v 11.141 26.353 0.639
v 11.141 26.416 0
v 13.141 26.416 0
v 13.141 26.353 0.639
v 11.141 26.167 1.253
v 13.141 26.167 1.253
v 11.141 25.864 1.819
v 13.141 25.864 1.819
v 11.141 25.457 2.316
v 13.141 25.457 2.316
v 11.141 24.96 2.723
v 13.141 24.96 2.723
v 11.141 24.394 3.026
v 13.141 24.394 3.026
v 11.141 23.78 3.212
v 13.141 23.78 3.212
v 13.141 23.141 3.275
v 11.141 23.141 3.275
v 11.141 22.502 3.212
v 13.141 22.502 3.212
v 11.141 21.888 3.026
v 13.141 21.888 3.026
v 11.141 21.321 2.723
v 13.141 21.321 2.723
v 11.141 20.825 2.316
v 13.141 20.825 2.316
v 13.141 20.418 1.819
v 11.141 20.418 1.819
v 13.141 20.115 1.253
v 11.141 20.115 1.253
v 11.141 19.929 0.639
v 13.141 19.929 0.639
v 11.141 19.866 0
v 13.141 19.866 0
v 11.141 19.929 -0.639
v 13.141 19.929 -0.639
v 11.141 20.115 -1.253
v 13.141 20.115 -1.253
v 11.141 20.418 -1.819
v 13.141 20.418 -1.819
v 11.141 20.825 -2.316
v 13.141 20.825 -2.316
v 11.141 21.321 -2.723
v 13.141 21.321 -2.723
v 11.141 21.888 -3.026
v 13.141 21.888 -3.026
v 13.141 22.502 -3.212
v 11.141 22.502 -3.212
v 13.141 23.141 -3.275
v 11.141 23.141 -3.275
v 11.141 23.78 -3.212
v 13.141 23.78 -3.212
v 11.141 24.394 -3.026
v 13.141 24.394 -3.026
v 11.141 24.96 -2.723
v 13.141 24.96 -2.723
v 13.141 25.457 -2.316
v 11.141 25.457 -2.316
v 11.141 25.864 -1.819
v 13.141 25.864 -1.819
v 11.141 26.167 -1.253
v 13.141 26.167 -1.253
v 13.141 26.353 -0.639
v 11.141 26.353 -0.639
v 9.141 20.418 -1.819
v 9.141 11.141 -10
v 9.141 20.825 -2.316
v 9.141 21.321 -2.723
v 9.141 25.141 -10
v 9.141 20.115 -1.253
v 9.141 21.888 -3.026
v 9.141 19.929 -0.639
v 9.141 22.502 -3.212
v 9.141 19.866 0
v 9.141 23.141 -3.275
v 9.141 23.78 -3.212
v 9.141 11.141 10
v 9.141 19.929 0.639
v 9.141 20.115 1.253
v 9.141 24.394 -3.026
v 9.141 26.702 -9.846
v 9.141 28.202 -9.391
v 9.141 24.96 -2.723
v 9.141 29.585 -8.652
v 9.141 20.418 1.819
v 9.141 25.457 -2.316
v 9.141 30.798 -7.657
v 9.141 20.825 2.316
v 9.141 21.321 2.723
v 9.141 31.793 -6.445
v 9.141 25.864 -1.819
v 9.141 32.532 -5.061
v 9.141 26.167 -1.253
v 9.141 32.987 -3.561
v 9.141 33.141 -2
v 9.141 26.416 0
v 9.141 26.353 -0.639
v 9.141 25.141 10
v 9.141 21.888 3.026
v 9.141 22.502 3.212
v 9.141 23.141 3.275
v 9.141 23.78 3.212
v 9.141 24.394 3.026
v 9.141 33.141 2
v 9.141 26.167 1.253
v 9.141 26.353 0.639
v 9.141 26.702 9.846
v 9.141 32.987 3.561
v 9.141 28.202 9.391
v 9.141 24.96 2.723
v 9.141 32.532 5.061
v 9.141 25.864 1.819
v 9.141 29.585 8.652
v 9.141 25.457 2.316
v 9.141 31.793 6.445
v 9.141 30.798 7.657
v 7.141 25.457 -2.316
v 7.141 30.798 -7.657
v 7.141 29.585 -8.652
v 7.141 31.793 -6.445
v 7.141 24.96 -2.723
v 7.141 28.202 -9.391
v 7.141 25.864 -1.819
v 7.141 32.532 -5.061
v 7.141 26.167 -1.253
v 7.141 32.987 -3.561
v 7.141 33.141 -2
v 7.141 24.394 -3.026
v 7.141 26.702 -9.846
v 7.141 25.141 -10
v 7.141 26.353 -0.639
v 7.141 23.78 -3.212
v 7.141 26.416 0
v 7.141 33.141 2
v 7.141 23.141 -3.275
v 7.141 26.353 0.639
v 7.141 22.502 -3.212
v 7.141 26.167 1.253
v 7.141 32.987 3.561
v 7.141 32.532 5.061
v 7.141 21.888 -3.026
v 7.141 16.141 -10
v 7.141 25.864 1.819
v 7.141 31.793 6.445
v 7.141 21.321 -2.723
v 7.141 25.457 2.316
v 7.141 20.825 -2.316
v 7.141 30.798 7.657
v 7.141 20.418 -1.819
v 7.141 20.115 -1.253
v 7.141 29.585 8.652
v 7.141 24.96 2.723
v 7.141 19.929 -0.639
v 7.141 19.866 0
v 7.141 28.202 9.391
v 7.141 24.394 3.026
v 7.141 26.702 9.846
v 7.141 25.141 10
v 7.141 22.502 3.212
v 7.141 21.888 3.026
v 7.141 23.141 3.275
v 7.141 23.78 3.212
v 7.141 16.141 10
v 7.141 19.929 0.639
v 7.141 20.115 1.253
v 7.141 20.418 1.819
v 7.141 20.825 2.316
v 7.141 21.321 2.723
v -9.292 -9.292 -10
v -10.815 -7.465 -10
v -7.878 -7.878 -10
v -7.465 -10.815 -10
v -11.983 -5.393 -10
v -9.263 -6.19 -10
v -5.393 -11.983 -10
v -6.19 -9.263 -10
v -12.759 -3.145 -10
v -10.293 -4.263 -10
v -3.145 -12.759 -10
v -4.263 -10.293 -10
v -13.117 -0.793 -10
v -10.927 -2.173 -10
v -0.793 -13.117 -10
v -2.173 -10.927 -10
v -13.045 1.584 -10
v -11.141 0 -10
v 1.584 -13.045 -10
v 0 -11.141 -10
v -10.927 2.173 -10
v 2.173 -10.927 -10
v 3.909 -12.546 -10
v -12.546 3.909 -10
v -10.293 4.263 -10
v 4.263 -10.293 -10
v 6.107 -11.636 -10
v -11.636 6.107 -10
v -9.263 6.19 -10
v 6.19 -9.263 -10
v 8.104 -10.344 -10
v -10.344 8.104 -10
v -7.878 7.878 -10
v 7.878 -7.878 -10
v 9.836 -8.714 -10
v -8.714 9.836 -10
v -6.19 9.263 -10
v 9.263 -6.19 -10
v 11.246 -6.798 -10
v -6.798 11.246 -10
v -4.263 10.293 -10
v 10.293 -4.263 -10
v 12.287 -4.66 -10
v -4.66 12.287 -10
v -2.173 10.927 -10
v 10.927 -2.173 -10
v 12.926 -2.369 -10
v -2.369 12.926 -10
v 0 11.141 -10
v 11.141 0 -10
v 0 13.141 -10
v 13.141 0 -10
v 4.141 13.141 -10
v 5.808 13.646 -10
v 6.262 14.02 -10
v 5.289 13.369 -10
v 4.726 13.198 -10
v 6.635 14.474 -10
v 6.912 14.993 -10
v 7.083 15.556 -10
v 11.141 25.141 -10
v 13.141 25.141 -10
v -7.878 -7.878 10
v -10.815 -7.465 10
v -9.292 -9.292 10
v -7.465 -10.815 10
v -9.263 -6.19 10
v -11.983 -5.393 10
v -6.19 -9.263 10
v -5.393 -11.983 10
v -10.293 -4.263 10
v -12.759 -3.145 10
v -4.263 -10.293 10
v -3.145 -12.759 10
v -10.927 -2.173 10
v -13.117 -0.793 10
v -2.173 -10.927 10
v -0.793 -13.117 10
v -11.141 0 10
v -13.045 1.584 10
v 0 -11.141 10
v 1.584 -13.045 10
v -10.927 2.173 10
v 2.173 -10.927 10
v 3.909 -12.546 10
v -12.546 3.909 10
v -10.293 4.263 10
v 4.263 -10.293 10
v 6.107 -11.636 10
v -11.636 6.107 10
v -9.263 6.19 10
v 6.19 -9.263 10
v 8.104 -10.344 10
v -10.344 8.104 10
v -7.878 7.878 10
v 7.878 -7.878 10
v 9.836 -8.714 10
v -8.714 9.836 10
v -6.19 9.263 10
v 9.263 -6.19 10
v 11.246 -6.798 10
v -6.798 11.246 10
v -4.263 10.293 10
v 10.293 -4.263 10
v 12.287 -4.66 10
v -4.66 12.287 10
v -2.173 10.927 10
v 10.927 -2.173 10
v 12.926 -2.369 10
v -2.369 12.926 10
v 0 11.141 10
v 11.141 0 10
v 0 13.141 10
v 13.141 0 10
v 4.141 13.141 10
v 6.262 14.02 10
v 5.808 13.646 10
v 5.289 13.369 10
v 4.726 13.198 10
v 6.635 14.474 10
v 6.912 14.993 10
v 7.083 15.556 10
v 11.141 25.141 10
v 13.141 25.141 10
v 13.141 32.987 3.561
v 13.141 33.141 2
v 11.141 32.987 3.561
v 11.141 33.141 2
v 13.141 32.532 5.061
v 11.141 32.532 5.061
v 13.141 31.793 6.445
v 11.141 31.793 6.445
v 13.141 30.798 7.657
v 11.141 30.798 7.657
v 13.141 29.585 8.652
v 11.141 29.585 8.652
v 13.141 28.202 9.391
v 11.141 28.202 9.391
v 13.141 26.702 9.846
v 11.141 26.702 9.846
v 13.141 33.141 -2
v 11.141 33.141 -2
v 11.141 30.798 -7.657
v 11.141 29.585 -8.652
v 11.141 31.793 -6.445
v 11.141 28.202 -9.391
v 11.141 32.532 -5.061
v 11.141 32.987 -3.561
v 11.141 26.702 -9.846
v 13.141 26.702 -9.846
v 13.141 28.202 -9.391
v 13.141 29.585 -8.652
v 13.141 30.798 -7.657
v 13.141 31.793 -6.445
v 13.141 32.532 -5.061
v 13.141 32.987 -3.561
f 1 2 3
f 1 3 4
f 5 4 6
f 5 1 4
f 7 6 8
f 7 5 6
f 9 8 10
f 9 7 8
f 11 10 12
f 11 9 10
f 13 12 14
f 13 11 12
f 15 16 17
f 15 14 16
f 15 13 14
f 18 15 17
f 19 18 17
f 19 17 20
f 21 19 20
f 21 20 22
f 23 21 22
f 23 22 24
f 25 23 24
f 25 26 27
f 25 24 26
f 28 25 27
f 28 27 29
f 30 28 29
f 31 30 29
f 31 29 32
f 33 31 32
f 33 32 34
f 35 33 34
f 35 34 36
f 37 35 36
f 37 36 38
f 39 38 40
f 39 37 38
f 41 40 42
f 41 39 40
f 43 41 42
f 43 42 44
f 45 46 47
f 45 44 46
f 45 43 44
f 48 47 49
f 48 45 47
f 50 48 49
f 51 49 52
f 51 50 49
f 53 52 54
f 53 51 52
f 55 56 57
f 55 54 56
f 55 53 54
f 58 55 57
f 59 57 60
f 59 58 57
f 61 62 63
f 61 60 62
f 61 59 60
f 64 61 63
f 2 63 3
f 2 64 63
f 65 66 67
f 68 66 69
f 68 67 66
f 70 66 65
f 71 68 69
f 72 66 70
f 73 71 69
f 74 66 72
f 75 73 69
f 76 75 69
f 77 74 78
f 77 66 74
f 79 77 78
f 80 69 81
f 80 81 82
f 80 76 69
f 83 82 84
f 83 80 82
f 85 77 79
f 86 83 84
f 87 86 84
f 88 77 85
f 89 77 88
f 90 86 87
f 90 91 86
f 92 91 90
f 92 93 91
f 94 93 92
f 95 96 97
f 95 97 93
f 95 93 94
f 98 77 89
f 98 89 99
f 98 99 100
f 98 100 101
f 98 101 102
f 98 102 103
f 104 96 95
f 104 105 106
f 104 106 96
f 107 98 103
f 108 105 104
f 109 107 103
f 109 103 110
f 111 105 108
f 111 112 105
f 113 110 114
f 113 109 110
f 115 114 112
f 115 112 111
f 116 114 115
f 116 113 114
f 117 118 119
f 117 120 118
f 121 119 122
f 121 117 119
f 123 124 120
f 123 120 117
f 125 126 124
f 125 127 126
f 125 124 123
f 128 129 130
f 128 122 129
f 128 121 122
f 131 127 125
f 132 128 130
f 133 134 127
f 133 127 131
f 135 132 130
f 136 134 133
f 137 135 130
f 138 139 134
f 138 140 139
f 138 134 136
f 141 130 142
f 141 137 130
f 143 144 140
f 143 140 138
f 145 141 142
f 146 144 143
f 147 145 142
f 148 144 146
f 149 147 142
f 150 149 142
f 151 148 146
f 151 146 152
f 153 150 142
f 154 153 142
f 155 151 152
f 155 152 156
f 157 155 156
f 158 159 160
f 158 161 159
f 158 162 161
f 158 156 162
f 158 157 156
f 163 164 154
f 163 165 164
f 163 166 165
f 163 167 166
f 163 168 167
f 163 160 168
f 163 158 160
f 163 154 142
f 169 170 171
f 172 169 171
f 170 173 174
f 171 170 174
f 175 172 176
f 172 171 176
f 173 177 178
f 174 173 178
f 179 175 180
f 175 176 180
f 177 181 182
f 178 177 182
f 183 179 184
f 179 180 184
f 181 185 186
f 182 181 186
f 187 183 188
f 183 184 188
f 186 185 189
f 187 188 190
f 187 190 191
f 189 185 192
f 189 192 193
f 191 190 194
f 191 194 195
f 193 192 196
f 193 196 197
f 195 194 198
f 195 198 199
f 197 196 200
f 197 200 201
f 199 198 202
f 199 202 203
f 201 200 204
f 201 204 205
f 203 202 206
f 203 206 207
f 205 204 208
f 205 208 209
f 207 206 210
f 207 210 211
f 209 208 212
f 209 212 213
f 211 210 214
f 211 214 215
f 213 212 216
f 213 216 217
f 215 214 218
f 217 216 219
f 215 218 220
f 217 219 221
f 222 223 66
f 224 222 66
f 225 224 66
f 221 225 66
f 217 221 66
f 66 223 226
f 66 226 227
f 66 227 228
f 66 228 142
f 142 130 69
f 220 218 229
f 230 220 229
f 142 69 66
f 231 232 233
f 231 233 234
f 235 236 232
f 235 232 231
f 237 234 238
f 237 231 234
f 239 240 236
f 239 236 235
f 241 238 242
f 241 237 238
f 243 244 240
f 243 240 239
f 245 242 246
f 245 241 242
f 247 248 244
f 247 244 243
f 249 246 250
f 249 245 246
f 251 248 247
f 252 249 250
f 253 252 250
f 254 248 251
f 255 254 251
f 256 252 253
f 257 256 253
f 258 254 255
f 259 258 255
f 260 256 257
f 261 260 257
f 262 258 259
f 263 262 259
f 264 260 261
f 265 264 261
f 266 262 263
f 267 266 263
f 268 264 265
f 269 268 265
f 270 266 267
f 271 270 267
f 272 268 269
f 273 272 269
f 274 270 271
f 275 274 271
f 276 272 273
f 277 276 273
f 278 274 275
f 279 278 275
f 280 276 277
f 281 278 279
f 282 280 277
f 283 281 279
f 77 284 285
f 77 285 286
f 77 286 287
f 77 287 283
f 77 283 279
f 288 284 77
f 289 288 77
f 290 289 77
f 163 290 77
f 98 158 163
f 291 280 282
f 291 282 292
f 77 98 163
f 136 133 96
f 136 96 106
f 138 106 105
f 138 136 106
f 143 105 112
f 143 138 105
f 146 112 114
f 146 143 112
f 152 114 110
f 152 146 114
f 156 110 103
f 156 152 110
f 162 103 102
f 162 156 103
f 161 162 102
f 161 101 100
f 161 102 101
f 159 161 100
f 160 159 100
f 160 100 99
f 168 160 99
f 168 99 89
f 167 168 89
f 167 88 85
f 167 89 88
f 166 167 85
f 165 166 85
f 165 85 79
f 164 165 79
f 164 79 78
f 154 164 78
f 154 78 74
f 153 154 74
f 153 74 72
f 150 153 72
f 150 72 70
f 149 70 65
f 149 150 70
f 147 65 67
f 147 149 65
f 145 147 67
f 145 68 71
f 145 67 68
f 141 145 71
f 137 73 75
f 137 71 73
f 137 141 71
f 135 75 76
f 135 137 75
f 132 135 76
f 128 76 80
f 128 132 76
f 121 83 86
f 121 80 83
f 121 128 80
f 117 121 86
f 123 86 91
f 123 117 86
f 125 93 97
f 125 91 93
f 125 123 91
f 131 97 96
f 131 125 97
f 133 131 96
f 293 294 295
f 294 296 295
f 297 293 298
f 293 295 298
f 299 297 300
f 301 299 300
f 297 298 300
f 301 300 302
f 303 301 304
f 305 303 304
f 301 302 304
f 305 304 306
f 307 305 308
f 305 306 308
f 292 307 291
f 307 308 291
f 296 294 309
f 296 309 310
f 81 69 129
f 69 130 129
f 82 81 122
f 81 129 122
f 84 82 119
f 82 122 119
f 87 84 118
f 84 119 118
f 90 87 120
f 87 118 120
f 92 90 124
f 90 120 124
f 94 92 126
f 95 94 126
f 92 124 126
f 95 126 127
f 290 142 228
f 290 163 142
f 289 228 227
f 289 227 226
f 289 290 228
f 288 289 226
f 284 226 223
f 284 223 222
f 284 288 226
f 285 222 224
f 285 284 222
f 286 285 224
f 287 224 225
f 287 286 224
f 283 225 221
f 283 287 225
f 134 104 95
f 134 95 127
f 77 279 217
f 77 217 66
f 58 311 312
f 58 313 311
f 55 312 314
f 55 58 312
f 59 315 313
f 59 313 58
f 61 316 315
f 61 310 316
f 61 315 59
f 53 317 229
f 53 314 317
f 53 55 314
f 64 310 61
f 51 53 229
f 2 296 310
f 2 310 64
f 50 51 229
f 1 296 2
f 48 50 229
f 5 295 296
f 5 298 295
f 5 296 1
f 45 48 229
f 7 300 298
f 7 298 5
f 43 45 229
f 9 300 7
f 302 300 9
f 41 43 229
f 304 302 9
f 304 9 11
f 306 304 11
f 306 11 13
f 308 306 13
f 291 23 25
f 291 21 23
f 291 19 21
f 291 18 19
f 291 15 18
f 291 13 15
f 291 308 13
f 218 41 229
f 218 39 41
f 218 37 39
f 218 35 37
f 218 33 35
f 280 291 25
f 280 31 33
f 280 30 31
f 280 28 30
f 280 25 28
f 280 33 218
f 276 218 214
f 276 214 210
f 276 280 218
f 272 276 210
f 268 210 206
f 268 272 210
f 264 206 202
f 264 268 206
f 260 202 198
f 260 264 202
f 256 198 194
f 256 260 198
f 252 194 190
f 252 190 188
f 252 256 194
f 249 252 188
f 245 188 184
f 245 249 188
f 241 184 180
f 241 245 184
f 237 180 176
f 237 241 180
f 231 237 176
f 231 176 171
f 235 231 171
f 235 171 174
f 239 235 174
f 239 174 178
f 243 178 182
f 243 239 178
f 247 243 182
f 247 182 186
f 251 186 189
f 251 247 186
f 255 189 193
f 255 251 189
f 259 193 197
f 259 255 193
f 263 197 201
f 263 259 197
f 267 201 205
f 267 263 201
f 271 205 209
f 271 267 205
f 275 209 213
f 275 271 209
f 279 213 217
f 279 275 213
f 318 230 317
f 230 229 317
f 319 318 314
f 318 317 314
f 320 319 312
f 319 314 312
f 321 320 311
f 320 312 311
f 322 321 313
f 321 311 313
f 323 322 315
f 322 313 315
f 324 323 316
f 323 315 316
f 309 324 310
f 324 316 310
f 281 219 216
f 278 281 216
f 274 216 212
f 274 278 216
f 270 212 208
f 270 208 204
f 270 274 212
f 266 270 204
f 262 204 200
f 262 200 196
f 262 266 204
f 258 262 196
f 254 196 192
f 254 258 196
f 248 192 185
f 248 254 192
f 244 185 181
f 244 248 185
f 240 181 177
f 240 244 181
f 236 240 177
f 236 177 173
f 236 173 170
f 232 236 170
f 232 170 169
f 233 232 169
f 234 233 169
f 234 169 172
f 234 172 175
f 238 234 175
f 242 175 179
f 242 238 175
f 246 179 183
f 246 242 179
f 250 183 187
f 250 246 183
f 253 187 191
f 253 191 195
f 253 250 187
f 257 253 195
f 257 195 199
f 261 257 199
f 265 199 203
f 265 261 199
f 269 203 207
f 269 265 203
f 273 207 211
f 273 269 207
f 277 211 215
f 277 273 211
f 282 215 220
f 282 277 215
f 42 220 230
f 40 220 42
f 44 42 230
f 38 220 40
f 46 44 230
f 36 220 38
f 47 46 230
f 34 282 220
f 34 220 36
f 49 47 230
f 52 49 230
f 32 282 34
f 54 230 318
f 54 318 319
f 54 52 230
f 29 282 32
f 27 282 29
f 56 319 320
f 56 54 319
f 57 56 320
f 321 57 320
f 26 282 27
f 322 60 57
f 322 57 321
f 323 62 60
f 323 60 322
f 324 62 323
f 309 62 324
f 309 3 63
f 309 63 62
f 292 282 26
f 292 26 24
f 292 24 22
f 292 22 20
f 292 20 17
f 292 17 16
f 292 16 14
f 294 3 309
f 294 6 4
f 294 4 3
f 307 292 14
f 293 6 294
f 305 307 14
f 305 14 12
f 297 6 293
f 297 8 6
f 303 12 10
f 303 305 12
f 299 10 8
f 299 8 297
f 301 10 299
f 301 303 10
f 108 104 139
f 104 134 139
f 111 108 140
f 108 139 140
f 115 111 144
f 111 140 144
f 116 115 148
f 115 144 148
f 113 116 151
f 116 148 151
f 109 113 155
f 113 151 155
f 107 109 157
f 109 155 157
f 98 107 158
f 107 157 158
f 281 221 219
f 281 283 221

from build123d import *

# Parameters (mm, degrees)
F1_DEPTH = 10
F2_R     = 3.275
F3_DEPTH = 13.1418462065
F4_R     = 3
F5_R     = 8


with BuildPart() as f1:
    # F0 (on Top) → F1 (new body, symmetric)
    with BuildSketch(Plane.XY):
        with BuildLine():
            Line((11.1408462065, 6.968743418), (11.1408462065, 0))
            ThreePointArc((11.1408462065, 0), (-7.8777679008, -7.8777679008), (0, 11.1408462065))
            Line((0, 11.1408462065), (6.968743418, 11.1408462065))
            ThreePointArc((6.968743418, 11.1408462065), (3.6250305111, 12.6309537572), (0, 13.1408462065))
            ThreePointArc((0, 13.1408462065), (-9.2919814631, -9.2919814631), (13.1408462065, 0))
            ThreePointArc((13.1408462065, 0), (12.6309537572, 3.6250305111), (11.1408462065, 6.968743418))
        make_face()
        with BuildLine():
            ThreePointArc((0, 13.1408462065), (3.6250305111, 12.6309537572), (6.968743418, 11.1408462065))
            Line((6.968743418, 11.1408462065), (9.1408462065, 11.1408462065))
            Line((9.1408462065, 11.1408462065), (9.1408462065, 33.1408462065))
            Line((9.1408462065, 33.1408462065), (7.1408462065, 33.1408462065))
            Line((7.1408462065, 33.1408462065), (7.1408462065, 13.1408462065))
            Line((7.1408462065, 13.1408462065), (0, 13.1408462065))
        make_face()
        with BuildLine():
            Line((11.1408462065, 33.1408462065), (11.1408462065, 6.968743418))
            ThreePointArc((11.1408462065, 6.968743418), (12.6309537572, 3.6250305111), (13.1408462065, 0))
            Line((13.1408462065, 0), (13.1408462065, 33.1408462065))
            Line((13.1408462065, 33.1408462065), (11.1408462065, 33.1408462065))
        make_face()
    extrude(amount=F1_DEPTH, both=True)

    # F2 (on Right) → F3 (cut, through all)
    with BuildSketch(Plane.YZ):
        with Locations((23.1408462065, 0)):
            Circle(F2_R)
    extrude(amount=F3_DEPTH, mode=Mode.SUBTRACT)

    # F4
    f4_edges = [f1.edges().sort_by_distance(p)[0] for p in [
        (7.140846, 13.140846, 0),
    ]]
    fillet(f4_edges, radius=F4_R)

    # F5
    f5_edges = [f1.edges().sort_by_distance(p)[0] for p in [
        (8.140846, 33.140846, 10),
        (12.140846, 33.140846, 10),
        (12.140846, 33.140846, -10),
        (8.140846, 33.140846, -10),
    ]]
    fillet(f5_edges, radius=F5_R)


solid = f1.part
